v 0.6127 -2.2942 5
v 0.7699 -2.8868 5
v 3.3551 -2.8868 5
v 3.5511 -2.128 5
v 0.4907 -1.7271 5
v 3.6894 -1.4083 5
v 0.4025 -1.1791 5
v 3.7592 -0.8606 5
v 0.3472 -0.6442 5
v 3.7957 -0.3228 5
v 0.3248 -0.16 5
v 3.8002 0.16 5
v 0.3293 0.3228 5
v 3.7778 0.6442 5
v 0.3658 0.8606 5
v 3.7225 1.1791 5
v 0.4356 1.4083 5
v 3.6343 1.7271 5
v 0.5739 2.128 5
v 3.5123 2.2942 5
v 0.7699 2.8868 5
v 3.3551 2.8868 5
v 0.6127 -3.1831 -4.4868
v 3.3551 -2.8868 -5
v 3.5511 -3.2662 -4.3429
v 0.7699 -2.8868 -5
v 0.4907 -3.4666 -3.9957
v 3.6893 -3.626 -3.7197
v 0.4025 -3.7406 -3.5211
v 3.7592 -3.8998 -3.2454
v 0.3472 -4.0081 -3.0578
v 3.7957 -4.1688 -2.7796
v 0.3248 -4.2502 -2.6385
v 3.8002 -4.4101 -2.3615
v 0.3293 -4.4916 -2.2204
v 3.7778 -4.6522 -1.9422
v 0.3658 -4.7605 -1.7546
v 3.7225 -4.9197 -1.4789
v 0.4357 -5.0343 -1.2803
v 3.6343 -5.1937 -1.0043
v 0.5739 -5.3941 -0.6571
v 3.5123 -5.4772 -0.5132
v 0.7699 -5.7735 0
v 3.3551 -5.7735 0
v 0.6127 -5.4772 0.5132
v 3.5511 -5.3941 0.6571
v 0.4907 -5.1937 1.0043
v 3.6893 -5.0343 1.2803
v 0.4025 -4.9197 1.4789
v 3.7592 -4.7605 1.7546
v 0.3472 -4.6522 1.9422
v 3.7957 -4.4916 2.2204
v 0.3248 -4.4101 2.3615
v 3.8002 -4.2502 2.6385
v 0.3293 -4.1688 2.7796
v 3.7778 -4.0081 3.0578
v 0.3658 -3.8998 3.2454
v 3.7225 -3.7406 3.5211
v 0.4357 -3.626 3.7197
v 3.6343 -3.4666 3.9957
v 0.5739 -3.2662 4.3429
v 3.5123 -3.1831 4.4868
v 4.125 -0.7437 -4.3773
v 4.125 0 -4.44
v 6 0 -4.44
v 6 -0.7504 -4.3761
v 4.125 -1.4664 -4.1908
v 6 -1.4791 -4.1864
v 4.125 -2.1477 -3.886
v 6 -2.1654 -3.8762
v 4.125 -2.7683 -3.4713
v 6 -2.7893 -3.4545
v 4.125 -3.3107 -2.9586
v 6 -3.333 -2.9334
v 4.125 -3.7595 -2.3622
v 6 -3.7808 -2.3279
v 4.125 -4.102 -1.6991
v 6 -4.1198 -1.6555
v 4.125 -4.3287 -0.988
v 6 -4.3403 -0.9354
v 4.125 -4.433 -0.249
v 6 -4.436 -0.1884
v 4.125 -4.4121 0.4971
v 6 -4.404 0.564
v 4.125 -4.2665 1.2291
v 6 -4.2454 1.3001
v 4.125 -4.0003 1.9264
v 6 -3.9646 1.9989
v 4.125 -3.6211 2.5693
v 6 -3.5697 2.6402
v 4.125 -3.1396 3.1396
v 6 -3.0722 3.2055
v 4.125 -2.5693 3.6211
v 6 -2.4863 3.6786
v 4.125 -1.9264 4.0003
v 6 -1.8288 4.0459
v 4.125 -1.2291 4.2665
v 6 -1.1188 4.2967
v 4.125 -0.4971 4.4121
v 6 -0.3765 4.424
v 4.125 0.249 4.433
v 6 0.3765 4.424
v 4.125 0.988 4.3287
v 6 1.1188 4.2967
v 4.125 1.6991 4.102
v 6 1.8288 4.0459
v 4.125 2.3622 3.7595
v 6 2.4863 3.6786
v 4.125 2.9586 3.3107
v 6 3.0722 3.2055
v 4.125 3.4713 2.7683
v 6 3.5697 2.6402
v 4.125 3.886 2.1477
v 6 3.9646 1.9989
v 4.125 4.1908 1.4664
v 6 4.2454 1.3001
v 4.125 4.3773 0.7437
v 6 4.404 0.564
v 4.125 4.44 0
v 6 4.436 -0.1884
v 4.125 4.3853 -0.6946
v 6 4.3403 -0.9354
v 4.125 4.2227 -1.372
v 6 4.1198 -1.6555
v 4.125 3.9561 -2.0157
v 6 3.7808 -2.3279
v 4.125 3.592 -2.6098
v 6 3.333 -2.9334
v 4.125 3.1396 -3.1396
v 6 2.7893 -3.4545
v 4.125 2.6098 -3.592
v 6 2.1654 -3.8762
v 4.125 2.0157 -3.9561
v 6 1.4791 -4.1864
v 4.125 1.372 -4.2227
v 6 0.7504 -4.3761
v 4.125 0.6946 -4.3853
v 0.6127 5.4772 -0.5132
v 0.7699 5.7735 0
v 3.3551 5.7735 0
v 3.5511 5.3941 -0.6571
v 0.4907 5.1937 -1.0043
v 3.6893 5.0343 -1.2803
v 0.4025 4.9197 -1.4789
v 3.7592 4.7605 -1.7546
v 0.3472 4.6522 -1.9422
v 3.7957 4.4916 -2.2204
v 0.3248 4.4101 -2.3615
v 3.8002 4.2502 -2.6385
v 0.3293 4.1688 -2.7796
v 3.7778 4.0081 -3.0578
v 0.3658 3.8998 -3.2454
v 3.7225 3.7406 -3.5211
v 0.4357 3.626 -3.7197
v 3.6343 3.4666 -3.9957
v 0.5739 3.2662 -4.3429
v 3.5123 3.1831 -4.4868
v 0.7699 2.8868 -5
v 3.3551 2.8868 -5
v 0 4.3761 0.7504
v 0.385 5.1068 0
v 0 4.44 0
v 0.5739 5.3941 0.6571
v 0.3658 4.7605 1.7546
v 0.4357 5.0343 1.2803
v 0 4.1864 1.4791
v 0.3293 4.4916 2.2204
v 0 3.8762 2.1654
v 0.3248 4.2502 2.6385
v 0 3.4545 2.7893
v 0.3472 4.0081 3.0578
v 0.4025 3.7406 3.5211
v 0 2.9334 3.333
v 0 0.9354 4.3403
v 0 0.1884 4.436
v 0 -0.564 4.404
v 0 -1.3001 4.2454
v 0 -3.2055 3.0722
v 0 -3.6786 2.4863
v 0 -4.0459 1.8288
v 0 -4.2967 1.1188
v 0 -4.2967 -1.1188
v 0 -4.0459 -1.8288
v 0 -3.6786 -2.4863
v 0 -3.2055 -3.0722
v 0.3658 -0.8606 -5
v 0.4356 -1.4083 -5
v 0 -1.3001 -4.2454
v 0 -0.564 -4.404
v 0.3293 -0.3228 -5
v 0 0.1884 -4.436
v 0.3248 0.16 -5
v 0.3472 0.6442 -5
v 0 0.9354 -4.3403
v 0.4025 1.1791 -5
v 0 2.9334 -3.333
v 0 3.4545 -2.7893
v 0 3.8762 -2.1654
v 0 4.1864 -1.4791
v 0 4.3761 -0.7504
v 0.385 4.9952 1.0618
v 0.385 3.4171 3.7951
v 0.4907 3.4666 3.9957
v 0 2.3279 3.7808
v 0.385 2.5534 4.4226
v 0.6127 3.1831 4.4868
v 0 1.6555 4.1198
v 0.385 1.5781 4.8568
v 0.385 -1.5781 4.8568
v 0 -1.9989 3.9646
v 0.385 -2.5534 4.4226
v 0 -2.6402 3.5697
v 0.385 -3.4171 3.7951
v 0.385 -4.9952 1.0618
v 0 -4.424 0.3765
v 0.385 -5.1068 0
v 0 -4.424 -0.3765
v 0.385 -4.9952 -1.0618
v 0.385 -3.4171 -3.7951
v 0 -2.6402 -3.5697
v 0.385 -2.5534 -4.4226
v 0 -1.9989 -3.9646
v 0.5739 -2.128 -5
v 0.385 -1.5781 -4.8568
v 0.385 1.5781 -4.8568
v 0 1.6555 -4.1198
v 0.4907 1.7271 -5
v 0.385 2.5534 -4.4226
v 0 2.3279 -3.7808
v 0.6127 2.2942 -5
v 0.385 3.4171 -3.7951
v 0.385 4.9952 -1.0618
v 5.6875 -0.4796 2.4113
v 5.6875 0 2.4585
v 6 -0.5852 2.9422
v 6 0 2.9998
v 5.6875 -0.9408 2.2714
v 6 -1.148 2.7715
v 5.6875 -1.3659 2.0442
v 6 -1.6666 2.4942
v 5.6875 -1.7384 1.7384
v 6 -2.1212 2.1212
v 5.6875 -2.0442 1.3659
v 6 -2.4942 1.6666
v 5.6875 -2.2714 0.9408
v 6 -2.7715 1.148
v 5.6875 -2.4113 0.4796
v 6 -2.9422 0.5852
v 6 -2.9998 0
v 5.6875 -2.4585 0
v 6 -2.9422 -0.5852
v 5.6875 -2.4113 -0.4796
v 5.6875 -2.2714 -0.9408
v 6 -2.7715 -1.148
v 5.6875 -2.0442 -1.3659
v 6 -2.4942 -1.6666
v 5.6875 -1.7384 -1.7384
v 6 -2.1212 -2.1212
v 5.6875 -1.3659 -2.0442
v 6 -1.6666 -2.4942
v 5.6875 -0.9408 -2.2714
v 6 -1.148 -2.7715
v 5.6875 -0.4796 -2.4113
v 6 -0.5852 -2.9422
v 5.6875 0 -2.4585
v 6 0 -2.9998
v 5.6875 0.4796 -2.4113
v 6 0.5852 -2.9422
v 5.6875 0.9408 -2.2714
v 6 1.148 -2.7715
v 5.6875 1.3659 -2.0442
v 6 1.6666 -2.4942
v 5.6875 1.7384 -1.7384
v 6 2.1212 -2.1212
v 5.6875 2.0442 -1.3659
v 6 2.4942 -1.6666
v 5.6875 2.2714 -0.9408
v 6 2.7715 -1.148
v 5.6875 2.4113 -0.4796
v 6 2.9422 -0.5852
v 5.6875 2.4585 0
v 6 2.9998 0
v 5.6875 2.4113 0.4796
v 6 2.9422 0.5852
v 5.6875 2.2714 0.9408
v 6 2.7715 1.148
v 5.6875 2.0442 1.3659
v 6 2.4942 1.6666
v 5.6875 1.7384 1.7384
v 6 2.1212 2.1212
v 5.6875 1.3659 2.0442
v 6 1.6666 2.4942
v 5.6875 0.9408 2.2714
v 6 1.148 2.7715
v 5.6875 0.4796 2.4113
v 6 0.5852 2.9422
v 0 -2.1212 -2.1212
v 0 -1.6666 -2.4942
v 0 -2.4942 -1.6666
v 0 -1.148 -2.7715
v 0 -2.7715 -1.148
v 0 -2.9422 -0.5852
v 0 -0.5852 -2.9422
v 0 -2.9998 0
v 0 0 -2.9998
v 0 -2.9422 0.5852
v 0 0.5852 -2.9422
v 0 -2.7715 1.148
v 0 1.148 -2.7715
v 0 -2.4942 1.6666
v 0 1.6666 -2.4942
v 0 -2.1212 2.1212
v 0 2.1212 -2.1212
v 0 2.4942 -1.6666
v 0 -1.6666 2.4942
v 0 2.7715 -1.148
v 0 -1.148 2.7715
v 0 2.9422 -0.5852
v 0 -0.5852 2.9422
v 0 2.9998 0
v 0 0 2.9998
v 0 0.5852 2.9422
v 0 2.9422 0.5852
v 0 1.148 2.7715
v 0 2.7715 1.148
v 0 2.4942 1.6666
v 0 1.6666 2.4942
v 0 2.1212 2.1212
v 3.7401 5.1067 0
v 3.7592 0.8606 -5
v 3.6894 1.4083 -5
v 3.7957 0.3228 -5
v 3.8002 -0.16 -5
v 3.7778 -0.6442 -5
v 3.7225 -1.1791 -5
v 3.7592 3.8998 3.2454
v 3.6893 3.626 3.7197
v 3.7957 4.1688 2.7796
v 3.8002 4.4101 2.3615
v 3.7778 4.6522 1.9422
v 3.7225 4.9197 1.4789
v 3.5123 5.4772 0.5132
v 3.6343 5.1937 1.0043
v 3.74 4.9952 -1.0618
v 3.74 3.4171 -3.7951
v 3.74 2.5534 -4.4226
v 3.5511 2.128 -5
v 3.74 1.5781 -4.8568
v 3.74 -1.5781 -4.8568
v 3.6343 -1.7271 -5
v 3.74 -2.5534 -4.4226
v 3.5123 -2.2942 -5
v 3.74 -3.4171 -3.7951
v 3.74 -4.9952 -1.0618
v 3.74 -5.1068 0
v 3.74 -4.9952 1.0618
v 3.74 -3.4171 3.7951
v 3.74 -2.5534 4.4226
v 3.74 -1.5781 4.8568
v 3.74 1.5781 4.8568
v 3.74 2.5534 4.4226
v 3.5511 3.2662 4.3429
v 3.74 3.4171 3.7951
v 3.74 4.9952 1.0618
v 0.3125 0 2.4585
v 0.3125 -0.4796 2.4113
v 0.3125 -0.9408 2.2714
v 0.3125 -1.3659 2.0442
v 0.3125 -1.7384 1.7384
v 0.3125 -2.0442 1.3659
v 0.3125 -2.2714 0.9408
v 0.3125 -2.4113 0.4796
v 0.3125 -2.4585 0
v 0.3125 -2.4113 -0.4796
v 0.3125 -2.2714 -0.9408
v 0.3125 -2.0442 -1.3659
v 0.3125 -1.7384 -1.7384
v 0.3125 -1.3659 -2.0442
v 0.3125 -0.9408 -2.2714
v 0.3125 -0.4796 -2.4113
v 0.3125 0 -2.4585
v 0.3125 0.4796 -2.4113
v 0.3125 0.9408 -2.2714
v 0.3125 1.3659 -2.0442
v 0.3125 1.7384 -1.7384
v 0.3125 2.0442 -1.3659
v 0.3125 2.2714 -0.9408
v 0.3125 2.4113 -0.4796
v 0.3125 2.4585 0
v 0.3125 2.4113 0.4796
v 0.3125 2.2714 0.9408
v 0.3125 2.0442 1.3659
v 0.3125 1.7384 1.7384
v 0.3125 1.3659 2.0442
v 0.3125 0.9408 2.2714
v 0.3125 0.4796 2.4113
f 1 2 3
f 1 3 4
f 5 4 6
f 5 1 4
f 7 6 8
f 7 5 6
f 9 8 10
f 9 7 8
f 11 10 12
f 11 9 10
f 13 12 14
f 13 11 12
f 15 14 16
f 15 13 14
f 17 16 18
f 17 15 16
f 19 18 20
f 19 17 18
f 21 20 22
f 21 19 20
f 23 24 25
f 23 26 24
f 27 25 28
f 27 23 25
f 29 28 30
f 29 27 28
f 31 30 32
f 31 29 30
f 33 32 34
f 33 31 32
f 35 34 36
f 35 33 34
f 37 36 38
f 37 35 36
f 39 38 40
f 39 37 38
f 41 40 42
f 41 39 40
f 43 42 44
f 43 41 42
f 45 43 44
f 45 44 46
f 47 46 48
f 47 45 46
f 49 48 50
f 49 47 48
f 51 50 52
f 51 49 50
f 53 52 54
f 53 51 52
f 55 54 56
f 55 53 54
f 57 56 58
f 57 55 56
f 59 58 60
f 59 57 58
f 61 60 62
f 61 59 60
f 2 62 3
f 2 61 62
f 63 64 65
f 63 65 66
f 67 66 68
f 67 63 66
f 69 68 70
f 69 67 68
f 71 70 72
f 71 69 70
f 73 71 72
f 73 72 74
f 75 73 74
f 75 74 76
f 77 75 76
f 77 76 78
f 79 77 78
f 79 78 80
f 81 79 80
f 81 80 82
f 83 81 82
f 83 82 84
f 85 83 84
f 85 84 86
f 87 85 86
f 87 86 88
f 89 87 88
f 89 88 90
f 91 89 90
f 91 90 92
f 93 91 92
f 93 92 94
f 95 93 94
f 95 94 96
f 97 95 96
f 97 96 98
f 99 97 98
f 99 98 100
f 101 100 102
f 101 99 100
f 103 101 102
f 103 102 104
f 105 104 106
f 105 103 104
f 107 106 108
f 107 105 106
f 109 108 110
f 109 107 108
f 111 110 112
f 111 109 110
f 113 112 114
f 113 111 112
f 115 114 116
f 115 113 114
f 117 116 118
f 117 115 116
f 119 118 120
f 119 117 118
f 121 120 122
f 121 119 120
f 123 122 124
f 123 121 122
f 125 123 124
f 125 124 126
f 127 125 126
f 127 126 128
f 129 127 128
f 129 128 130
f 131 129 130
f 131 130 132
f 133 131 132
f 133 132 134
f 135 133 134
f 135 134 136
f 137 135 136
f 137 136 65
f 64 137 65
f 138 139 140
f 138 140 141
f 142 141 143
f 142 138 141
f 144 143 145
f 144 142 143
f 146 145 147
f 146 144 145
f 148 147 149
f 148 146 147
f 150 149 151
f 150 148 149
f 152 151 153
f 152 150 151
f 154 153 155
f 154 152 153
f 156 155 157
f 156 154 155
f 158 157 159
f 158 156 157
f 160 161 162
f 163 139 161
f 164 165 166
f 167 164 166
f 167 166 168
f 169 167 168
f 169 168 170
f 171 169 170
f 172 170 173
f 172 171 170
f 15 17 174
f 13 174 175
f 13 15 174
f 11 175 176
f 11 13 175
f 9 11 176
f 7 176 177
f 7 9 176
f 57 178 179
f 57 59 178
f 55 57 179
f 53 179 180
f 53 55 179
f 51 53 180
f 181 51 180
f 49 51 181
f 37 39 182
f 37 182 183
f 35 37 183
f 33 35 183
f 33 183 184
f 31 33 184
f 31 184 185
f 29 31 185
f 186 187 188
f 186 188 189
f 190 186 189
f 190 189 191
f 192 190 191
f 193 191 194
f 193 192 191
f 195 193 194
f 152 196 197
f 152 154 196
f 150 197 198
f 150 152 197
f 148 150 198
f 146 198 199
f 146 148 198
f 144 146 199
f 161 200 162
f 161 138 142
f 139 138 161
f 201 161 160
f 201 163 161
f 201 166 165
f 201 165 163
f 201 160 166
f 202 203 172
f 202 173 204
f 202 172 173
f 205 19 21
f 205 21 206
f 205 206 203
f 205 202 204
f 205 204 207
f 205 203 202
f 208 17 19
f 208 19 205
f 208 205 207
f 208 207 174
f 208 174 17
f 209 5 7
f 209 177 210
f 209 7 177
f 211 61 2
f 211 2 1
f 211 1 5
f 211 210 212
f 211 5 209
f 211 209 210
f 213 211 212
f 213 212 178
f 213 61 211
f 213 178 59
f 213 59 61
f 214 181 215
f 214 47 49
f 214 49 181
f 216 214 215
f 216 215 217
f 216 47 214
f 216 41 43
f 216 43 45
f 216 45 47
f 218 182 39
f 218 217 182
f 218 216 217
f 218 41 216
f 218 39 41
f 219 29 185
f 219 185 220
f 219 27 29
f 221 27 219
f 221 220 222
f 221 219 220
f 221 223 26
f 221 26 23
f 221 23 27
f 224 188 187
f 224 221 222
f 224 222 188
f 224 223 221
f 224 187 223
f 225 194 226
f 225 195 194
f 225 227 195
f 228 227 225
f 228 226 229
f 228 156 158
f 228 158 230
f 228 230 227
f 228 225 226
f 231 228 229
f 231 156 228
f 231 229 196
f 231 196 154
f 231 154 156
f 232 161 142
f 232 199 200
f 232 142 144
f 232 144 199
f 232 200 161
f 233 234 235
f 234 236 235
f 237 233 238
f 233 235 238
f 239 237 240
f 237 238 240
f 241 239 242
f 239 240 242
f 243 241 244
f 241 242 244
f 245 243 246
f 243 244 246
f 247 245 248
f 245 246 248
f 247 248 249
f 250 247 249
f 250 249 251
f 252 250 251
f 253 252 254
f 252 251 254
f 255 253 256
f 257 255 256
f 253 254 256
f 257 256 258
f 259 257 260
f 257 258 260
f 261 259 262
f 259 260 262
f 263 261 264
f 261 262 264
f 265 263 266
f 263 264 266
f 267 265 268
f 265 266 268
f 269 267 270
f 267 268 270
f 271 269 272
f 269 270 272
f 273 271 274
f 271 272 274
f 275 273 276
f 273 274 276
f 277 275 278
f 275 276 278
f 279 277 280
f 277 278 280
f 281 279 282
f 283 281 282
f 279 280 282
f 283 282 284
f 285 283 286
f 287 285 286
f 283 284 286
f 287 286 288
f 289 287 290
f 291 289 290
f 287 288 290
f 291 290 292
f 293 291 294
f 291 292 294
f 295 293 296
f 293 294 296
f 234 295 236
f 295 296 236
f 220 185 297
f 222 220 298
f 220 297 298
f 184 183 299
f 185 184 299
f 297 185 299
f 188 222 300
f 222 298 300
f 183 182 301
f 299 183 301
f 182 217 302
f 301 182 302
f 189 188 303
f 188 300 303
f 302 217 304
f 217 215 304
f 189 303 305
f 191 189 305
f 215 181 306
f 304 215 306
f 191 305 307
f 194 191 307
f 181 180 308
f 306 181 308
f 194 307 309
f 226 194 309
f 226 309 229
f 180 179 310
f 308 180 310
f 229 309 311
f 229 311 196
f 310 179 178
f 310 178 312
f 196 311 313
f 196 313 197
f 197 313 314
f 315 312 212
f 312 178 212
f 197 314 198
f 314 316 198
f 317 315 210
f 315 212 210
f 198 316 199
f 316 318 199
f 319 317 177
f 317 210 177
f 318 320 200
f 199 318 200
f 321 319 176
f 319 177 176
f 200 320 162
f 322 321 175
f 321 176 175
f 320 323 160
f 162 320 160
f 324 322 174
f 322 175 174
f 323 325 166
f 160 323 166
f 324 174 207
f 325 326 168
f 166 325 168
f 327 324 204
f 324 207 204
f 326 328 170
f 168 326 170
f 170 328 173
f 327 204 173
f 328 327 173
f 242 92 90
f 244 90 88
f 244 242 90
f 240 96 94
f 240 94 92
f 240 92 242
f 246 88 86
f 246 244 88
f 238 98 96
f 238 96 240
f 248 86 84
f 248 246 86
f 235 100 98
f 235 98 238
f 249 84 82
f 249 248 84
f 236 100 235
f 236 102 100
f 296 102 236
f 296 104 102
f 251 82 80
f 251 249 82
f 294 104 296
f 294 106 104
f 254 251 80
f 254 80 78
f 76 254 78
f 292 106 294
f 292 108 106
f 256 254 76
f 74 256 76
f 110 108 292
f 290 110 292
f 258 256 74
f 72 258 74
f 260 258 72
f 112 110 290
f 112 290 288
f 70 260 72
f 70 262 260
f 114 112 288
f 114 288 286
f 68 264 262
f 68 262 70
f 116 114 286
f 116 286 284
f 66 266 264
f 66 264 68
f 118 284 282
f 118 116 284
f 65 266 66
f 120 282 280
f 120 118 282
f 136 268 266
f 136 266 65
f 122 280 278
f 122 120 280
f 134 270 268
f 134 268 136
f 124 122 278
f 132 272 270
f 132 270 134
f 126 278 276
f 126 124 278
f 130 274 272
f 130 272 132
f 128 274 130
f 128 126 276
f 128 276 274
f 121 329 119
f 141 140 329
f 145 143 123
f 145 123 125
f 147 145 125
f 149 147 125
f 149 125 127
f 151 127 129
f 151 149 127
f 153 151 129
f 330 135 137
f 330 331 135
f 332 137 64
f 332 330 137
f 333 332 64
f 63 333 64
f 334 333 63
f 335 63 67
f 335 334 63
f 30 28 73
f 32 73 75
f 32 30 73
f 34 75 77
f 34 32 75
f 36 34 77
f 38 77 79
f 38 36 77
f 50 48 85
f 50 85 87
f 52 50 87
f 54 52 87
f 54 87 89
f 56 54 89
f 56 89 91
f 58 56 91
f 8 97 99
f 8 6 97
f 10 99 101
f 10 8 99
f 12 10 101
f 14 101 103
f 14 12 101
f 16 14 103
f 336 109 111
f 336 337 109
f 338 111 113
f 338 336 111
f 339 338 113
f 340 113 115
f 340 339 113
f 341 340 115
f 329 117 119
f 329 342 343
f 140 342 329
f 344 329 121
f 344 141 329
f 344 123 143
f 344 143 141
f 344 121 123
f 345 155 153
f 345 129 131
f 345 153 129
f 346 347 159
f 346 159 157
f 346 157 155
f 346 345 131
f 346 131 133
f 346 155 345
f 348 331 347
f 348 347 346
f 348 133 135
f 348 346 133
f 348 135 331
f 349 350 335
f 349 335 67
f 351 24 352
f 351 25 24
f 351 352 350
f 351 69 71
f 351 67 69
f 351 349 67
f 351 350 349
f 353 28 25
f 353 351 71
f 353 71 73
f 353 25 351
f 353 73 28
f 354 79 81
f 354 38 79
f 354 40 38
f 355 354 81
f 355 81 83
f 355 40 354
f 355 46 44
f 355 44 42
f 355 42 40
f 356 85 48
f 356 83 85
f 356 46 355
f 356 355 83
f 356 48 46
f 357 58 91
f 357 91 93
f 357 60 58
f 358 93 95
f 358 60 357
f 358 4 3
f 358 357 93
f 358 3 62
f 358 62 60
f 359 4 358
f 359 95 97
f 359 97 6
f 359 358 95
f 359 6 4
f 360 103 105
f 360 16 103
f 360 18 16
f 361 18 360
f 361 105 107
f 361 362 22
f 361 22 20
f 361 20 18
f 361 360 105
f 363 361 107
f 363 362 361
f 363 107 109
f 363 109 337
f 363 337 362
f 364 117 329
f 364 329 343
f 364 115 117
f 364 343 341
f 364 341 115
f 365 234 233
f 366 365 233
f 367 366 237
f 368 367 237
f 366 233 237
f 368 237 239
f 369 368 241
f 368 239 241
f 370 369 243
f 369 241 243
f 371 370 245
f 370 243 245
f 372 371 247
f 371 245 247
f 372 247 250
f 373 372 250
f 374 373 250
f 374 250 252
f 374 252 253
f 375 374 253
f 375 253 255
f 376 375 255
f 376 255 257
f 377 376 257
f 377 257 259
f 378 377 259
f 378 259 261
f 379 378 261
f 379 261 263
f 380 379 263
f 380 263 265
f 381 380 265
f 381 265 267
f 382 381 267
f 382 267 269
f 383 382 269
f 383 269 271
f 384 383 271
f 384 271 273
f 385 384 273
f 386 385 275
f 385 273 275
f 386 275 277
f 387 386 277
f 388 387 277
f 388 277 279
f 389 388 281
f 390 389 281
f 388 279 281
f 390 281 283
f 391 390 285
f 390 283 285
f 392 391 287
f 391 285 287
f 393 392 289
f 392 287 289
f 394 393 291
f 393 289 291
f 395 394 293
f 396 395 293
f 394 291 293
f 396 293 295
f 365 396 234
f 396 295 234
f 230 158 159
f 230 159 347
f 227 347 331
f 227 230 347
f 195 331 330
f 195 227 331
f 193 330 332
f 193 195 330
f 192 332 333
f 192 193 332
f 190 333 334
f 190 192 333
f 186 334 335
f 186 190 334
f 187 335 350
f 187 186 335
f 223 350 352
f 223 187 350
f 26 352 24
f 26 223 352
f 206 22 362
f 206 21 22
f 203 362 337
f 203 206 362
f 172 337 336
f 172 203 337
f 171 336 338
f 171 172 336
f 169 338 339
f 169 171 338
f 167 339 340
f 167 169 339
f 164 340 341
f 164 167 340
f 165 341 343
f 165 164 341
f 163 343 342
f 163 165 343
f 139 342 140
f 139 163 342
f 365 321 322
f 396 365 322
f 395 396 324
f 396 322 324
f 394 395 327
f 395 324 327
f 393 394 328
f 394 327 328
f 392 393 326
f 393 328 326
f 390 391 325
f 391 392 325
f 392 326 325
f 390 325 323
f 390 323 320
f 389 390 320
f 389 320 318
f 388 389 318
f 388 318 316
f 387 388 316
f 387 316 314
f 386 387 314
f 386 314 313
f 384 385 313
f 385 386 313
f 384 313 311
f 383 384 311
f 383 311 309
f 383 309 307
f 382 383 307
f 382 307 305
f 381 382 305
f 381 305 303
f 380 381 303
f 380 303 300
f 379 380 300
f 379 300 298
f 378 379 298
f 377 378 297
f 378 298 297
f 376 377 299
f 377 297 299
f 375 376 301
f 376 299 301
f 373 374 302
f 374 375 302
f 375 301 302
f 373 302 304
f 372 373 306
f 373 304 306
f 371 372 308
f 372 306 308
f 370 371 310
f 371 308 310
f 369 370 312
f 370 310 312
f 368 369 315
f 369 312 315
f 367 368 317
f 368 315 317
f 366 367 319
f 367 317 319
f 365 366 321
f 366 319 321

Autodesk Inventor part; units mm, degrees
ref_plane "YZ Plane" through (0, 0, 0) normal (1, 0, 0) x (0, 1, 0)
ref_plane "XZ Plane" through (0, 0, 0) normal (0, 1, 0) x (-1, 0, 0)
sketch "Sketch1" plane through (0, 0, 0) normal (1, 0, 0) x (0, 1, 0)
  line L0 (2.8868, -5) -> (-2.8868, -5)
  line L1 (-2.8868, -5) -> (-5.7735, 0)
  line L2 (-5.7735, 0) -> (-2.8868, 5)
  line L3 (-2.8868, 5) -> (2.8868, 5)
  line L4 (2.8868, 5) -> (5.7735, 0)
  line L5 (5.7735, 0) -> (2.8868, -5)
  point P0 (0, 0)
  point P1 (0, 0)
  dimension "d0" = 11.547
extrude "Body" add sketch "Sketch1" along normal blind 4.125
sketch "Sketch2" plane through (4.125, 0, 0) normal (1, 0, 0) x (0, 0, -1)
  circle A0 centre (0, 0) radius 4.44
  dimension "d7" = 8.88
extrude "Ring" add sketch "Sketch2" along normal blind 1.875
sketch "Sketch3" plane through (0, 0, 0) normal (0, 0, 1) x (1, 0, 0)
  line L0 (0, 2.8868) -> (0, 5.7735) projected
  line L1 (0, 5.7735) -> (4.125, 5.7735) projected
  line L2 (4.125, 2.8868) -> (4.125, 5.7735) projected
  line L3 (-0.825, 0) -> (4.95, 0) projected
  line L4 (0, 4.44) -> (0.7699, 5.7735)
  line L5 (3.3551, 5.7735) -> (4.125, 4.44)
  dimension "d3" = 30
  dimension "d4" = 30
  dimension "d5" = 8.88
  dimension "d6" = 8.88
revolve "Chamfer1" cut sketch "Sketch3" angle 360 about axis through (-10, 0, 0) along (1, 0, 0)
sketch "Sketch4" plane through (0, 0, 0) normal (-1, 0, 0) x (0, 0, 1)
  line L0 (0, -8.0829) -> (0, 8.0829) projected
  line L1 (-7, 0) -> (7, 0) projected
  point P0 (0, 0)
hole "Thread" at (0, 0, 0) direction (1, 0, 0) diameter 4.917 end through all thread size "M6x1" class "6H" standard "ISO Metric profile"
chamfer "Chamfer2" distance 0.5413 angle 30 1 edges at (0, 0, -2.4585) measured on face at (0, 3.7305, -0.453)
chamfer "Chamfer3" distance 0.5413 angle 30 1 edges at (6, 0, -2.4585) measured on face at (6, -0.5503, -3.7127)
ref_plane "Work Plane1" through (16.4347, 0, 0) normal (0, 0, 1) x (-1, 0, 0)
equation "\"d0\" = 1.1547 * SW"
equation "\"d1\" = KOH1"
equation "\"d7\" = SD2"
equation "\"d8\" = KOH - KOH1"
equation "\"d3\" = ANG1"
equation "\"d4\" = ANG2"
equation "\"d5\" = SW0"
equation "\"d6\" = SW01"
equation "\"d10\" = -0.5 * GD1 + 0.5 * NND"
equation "\"d46\" = -0.5 * GD1 + 0.5 * NND"
equation "\"d12\" = -0.5 * GD1 + 0.5 * NND"
equation "\"d47\" = -0.5 * GD1 + 0.5 * NND"
equation "\"ANG1\" = 30deg"
equation "\"ANG2\" = 30deg"
equation "\"NND\" = 6"
equation "\"KOH1\" = 4.125"
equation "\"KOH\" = 6"
equation "\"SW0\" = 8.88"
equation "\"SW01\" = SW0"
equation "\"SD2\" = SW0"
equation "\"GUL\" = 0.541266 * PTC"
equation "\"THREADDIA\" = 6"
equation "\"TOA\" = 30deg"
equation "\"PTC\" = 1"
equation "\"KOH1MIN\" = 3.3"
equation "\"E0\" = 1.155 * SW"
equation "\"GAL\" = 0.541266 * PTC"
equation "\"SW\" = 10"
equation "\"GD1\" = 4.917468"
properties part number "ISO 7042 - M6" material "Steel"
